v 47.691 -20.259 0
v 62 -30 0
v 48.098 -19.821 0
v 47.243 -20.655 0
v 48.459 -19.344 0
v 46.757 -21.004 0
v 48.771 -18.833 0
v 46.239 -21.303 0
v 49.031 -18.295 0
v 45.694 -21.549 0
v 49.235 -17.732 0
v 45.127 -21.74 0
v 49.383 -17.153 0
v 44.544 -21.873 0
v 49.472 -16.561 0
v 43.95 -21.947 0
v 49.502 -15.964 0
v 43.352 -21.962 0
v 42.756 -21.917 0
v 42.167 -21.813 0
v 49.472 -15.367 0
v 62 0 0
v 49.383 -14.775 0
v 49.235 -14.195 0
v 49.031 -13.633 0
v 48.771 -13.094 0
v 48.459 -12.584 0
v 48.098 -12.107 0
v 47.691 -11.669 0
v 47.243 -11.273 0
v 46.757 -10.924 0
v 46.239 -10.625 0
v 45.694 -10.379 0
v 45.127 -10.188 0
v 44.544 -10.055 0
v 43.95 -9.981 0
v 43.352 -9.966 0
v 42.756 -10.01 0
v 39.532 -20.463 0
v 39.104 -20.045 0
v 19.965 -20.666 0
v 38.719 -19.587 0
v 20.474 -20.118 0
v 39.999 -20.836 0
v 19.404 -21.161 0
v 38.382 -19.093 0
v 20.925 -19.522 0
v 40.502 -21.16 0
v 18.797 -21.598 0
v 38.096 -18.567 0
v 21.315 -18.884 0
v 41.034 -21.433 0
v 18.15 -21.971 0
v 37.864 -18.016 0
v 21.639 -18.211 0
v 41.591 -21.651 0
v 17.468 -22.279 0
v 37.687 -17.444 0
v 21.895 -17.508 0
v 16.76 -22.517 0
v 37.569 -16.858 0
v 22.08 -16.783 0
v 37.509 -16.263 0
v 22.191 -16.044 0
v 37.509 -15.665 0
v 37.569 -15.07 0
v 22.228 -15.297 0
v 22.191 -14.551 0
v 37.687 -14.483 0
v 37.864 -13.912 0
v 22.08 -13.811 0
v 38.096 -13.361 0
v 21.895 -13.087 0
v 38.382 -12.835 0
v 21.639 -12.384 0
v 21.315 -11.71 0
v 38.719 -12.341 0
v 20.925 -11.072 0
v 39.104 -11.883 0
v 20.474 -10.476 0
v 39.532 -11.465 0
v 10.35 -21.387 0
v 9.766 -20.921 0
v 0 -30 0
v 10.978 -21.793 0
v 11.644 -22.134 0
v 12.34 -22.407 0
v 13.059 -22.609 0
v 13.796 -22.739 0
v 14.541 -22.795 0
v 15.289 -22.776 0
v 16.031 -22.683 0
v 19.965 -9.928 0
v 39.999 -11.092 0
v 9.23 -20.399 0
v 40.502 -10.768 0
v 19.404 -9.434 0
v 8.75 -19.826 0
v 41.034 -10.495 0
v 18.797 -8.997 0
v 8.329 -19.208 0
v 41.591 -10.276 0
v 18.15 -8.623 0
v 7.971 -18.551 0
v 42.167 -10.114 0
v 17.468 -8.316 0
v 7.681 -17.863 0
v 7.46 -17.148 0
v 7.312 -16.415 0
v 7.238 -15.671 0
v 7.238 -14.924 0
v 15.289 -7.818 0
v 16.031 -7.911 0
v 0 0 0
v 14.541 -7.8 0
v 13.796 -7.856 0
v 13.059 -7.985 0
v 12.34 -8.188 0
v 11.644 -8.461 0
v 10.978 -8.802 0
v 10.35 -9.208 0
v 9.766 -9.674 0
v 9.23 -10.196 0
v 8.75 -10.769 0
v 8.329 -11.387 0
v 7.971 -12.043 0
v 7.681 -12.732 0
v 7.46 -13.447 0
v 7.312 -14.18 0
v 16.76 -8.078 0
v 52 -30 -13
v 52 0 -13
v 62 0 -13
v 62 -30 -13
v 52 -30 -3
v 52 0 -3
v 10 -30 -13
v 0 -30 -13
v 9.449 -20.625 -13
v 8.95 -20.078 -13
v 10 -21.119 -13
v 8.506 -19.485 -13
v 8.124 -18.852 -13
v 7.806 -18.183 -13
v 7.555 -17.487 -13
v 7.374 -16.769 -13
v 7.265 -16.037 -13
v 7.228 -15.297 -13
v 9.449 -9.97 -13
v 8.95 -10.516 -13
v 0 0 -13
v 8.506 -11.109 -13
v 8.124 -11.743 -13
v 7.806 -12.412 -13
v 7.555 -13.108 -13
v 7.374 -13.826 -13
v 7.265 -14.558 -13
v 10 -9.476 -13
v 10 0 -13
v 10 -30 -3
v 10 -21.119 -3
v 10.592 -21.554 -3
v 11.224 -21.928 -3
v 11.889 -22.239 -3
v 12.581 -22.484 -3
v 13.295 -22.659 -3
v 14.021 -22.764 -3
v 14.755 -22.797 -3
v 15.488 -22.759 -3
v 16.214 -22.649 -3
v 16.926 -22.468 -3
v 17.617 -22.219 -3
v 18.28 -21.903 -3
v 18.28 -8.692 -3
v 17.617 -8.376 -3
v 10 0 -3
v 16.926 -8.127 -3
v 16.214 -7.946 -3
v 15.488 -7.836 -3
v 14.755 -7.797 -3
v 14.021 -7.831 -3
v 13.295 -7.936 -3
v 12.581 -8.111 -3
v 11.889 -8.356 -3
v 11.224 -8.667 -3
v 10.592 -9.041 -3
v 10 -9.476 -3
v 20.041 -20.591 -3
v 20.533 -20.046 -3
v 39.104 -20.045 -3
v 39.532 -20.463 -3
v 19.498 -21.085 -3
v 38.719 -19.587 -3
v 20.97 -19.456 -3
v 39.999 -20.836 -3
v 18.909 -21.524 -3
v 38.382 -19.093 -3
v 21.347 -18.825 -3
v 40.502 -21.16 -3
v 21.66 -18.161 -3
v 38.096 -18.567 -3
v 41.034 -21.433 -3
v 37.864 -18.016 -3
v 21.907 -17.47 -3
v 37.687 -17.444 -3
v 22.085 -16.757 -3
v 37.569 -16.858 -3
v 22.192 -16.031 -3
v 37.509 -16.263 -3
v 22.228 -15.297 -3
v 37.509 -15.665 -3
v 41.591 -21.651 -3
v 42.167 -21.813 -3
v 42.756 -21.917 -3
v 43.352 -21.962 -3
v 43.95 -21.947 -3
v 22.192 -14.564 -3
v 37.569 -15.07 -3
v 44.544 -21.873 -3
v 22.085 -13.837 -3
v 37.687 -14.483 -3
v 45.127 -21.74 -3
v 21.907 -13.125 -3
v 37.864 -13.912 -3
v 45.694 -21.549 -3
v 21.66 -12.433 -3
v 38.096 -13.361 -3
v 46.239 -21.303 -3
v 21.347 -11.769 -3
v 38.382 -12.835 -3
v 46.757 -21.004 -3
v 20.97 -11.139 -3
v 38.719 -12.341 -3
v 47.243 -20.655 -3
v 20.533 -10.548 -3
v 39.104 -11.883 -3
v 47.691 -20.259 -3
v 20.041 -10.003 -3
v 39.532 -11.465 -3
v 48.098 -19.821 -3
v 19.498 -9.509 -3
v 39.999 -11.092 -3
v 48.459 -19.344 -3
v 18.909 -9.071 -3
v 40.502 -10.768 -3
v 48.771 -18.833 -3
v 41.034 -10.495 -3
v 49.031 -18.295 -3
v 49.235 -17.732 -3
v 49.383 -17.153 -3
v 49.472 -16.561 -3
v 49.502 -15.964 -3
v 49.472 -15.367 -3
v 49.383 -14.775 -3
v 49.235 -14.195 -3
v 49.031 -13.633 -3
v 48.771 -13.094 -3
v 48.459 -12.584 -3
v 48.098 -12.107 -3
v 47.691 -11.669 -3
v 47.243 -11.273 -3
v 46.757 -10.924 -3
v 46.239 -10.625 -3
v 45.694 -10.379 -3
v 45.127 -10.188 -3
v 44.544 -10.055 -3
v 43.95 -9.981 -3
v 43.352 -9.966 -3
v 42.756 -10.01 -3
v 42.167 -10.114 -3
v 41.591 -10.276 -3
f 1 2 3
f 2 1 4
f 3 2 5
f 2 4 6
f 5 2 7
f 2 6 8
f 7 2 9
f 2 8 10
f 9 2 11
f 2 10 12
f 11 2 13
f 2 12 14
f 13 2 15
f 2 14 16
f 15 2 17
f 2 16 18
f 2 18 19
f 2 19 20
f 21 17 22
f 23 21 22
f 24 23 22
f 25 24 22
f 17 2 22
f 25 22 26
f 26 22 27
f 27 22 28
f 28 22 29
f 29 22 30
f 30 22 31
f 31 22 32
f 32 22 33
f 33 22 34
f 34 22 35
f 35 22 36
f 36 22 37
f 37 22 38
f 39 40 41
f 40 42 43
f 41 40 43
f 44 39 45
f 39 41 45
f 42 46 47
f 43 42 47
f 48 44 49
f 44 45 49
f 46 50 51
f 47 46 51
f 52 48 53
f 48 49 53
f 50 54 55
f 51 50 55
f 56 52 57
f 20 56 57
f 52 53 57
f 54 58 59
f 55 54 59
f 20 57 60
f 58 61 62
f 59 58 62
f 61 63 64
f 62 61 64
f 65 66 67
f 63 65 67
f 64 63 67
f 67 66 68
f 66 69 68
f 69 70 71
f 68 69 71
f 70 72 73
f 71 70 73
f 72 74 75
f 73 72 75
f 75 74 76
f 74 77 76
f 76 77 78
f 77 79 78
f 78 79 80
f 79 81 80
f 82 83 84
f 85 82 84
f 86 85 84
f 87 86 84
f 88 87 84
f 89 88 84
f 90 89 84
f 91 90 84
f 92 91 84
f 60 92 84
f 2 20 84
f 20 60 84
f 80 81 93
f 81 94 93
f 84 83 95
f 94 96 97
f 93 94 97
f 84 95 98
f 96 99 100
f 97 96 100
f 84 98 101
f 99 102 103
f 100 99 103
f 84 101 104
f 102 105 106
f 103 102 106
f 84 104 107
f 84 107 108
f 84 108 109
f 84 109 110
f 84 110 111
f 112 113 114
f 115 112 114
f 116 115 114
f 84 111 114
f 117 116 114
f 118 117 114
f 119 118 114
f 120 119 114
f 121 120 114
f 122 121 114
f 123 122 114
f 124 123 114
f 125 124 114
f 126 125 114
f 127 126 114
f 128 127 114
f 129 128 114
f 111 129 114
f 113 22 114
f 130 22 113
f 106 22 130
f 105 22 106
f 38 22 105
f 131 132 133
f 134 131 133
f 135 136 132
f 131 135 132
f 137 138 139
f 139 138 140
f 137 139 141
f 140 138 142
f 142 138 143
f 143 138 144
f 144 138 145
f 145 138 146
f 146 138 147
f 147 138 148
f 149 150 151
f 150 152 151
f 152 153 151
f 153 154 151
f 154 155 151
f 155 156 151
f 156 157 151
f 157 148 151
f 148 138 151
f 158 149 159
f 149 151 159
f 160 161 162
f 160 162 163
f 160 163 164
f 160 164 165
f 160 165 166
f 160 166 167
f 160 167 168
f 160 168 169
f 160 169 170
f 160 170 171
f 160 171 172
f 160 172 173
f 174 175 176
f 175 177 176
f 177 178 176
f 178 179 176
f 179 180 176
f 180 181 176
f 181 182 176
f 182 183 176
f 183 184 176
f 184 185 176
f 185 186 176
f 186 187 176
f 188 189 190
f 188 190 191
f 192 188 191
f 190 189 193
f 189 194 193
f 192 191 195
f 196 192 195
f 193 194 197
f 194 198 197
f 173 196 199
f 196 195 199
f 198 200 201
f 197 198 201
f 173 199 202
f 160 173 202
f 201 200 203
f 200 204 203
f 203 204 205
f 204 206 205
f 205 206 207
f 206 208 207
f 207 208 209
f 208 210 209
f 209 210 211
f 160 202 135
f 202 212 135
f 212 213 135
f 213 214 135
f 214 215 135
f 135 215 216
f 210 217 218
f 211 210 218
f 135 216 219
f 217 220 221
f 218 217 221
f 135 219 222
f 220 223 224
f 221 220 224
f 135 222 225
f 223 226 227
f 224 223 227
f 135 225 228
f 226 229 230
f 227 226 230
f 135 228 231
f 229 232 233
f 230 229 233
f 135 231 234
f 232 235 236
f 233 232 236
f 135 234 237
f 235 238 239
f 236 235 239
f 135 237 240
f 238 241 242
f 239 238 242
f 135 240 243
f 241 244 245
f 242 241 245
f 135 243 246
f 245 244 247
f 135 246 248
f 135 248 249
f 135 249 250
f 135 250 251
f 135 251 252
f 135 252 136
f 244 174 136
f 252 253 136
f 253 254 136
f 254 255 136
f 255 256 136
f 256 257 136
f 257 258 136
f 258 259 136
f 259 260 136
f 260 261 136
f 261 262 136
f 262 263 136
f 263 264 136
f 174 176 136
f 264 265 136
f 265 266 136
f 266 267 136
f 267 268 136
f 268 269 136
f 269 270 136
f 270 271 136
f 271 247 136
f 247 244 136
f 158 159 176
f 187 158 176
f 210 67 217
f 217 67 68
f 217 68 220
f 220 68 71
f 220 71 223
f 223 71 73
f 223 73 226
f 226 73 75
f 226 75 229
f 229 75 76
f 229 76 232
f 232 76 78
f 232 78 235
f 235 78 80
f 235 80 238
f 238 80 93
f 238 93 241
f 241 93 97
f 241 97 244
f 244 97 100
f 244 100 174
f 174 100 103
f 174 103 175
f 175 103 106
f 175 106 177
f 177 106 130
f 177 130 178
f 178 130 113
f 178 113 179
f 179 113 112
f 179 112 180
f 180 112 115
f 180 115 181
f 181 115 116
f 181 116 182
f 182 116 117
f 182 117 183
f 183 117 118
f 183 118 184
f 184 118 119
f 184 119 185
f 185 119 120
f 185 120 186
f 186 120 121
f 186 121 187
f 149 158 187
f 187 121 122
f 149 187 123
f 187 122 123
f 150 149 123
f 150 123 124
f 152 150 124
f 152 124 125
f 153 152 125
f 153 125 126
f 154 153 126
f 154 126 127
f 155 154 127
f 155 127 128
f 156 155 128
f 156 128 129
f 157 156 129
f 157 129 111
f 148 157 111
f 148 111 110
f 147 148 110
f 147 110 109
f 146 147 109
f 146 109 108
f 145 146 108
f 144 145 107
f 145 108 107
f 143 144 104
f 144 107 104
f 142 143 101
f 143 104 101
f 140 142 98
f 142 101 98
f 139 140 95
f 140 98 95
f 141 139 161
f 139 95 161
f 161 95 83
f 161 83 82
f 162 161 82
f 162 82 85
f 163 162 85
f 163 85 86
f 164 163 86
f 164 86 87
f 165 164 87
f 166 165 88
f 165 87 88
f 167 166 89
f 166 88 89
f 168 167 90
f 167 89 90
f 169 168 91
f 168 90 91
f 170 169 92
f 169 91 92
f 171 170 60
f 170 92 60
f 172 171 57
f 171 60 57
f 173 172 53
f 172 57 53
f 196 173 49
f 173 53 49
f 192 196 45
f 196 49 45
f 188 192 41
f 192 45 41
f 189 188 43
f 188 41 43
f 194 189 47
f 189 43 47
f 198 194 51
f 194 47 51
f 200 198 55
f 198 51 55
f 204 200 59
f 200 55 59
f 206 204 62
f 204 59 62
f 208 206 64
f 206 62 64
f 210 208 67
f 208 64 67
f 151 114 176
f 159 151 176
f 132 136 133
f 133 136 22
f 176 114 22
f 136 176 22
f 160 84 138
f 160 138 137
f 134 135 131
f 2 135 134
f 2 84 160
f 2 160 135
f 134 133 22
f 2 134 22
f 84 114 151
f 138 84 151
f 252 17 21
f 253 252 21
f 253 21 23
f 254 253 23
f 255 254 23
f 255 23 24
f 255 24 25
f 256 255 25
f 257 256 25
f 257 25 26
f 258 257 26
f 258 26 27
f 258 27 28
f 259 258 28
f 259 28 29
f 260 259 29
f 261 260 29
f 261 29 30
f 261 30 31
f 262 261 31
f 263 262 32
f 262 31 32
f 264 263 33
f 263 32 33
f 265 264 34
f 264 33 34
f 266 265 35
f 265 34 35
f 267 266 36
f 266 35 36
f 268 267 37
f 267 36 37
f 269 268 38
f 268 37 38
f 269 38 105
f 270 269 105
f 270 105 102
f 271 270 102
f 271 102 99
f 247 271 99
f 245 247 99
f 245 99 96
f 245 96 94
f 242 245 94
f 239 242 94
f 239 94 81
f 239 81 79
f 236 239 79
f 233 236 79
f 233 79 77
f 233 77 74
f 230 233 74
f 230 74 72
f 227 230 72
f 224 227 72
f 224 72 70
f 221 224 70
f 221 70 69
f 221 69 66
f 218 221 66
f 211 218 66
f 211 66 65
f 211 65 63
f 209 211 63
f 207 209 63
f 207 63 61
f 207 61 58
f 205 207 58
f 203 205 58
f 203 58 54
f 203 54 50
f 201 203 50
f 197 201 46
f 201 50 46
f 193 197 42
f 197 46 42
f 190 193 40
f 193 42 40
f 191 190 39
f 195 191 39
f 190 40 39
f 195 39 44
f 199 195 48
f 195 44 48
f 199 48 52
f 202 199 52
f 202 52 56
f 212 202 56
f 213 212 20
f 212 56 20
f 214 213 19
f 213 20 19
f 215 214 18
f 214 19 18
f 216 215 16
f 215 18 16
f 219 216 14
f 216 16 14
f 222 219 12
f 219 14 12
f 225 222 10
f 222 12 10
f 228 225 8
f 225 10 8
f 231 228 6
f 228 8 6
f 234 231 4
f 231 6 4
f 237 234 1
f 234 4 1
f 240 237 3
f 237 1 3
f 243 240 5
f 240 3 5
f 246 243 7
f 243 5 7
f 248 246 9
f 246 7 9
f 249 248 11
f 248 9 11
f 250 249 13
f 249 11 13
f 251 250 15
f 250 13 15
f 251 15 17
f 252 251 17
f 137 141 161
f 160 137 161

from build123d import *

# Parameters (mm, degrees)
F2_DEPTH = 30
F3_DEPTH = 30
F4_R     = 7.5
F4_R_2   = 6
F5_DEPTH = 25


with BuildPart() as f2:
    # F0 (on Front) → F2 (new body)
    with BuildSketch(Plane.XZ):
        Polygon((0, 0), (0, -13), (10, -13), (10, -3), (52, -3), (52, -13), (62, -13), (62, 0), align=None)
    extrude(amount=F2_DEPTH)

    # F1 (on face) → F3 (join)
    with BuildSketch(Plane.XZ):
        Polygon((62, 0), (0, 0), (0, -13), (10, -13), (10, -3), (52, -3), (52, -13), (62, -13), align=None)
    extrude(amount=F3_DEPTH)

    # F4 (on face) → F5 (cut)
    with BuildSketch(Plane.XY):
        with Locations((14.728305, -15.297354)):
            Circle(F4_R)
        with Locations((43.501947, -15.963921)):
            Circle(F4_R_2)
    extrude(amount=-F5_DEPTH, mode=Mode.SUBTRACT)


solid = f2.part
